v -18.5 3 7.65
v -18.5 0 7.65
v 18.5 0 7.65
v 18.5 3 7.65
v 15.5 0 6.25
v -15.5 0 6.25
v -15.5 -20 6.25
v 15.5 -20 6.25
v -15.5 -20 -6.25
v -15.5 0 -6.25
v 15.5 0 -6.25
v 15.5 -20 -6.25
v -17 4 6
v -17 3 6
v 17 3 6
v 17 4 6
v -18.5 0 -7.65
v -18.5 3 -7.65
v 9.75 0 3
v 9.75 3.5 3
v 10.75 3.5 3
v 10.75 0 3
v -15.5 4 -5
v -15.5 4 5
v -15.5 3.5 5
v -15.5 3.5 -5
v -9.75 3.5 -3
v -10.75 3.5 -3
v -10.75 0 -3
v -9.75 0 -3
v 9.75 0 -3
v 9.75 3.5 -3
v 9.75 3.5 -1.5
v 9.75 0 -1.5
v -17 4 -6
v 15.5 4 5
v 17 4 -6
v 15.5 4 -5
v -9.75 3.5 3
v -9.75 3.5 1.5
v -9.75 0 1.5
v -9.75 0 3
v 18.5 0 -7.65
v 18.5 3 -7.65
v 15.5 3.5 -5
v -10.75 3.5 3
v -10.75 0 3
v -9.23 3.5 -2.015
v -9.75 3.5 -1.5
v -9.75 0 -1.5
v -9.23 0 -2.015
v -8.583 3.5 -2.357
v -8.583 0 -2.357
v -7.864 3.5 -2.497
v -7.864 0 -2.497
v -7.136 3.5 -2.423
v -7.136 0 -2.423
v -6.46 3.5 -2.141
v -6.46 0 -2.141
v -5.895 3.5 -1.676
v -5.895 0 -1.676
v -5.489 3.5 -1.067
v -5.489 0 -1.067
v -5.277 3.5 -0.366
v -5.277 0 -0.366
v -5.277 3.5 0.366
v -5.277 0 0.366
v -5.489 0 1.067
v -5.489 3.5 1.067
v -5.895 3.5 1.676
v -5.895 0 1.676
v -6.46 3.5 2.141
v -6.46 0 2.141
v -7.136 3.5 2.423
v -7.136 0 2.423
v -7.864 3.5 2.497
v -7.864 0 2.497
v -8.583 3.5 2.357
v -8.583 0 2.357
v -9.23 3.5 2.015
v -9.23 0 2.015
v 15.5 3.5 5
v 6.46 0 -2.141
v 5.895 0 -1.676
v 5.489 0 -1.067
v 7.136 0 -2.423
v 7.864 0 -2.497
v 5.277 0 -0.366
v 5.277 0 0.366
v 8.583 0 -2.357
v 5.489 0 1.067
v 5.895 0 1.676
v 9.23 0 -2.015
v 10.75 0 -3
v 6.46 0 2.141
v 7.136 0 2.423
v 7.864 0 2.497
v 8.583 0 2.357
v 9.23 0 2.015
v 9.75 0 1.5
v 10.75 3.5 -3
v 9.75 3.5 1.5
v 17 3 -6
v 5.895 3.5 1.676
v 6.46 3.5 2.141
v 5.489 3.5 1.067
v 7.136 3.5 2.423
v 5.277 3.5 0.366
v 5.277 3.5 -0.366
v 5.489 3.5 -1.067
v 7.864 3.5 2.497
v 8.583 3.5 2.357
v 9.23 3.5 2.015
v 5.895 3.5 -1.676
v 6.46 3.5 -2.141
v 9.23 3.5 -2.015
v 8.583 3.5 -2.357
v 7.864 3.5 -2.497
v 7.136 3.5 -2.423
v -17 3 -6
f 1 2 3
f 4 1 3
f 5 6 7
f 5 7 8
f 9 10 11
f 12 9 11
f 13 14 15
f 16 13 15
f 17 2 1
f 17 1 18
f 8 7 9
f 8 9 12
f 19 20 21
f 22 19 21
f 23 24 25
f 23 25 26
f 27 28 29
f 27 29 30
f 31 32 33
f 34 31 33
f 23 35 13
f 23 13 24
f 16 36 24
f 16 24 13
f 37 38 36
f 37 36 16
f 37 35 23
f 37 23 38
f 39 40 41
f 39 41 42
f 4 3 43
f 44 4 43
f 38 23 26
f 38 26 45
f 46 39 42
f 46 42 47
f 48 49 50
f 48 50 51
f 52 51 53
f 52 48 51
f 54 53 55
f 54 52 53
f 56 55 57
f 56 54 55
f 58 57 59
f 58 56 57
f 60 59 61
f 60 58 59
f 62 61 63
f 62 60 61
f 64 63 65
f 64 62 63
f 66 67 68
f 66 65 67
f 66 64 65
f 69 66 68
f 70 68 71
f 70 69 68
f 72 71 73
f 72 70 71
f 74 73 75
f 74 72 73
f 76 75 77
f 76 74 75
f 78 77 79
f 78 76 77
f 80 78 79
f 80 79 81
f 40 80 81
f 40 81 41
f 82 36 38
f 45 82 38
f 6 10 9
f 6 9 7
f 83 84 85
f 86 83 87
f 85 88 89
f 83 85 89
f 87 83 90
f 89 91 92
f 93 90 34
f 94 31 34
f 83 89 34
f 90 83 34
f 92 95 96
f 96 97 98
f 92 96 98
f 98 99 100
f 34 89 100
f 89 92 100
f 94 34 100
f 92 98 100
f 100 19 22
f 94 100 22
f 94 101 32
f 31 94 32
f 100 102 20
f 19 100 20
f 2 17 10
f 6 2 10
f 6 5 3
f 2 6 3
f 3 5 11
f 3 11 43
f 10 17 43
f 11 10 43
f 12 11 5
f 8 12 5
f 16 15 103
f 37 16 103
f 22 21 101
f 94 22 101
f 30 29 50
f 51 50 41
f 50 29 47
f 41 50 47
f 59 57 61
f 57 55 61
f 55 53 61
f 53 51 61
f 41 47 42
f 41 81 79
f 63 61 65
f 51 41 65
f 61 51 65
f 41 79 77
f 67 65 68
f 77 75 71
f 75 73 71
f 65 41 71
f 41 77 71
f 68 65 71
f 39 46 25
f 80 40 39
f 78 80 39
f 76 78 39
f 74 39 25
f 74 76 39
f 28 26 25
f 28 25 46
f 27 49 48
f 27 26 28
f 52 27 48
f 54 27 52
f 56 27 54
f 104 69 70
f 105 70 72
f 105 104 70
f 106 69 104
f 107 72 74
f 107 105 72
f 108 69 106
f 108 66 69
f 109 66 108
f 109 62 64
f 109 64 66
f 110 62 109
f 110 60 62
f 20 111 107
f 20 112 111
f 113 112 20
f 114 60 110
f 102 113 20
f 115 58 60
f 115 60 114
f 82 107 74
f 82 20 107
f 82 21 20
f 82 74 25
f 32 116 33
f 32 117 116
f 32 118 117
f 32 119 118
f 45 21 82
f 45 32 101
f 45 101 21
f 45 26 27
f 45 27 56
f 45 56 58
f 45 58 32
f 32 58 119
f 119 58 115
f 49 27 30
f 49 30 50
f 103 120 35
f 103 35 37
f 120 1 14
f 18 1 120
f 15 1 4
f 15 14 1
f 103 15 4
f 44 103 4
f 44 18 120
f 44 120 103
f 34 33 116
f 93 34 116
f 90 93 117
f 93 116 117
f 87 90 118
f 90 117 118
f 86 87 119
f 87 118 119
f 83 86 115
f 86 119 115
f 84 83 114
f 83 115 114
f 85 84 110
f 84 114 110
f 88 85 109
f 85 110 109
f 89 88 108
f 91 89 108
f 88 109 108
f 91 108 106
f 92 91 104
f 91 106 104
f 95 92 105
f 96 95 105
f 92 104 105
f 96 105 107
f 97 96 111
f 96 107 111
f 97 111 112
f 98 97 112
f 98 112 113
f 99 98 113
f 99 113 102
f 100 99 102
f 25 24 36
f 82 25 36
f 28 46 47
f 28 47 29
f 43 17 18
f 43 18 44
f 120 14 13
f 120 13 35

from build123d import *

# Parameters (mm, degrees)
SKETCH1_W           = 37
SKETCH1_H           = 15.3
BOSS_EXTRUDE1_DEPTH = 3
SKETCH2_W           = 34
SKETCH2_H           = 12
BOSS_EXTRUDE2_DEPTH = 1
SKETCH3_W           = 31
SKETCH3_H           = 10
CUT_EXTRUDE1_DEPTH  = 0.5
CUT_EXTRUDE2_DEPTH  = 5
SKETCH5_W           = 31
SKETCH5_H           = 12.5
BOSS_EXTRUDE3_DEPTH = 20


with BuildPart() as part:
    # Sketch1 → Boss-Extrude1 (new body)
    with BuildSketch(Plane(origin=(0, 0, 0), x_dir=(1, 0, 0), z_dir=(0, 1, 0))):
        Rectangle(SKETCH1_W, SKETCH1_H)
    extrude(amount=BOSS_EXTRUDE1_DEPTH)

    # Sketch2 → Boss-Extrude2 (add)
    with BuildSketch(Plane(origin=(0, 3, 0), x_dir=(1, 0, 0), z_dir=(0, 1, 0))):
        Rectangle(SKETCH2_W, SKETCH2_H)
    extrude(amount=BOSS_EXTRUDE2_DEPTH)

    # Sketch3 → Cut-Extrude1 (cut)
    with BuildSketch(Plane(origin=(0, 4, 0), x_dir=(1, 0, 0), z_dir=(0, 1, 0))):
        Rectangle(SKETCH3_W, SKETCH3_H)
    extrude(amount=-CUT_EXTRUDE1_DEPTH, mode=Mode.SUBTRACT)

    # Sketch4 → Cut-Extrude2 (cut)
    with BuildSketch(Plane(origin=(0, 3.5, 0), x_dir=(1, 0, 0), z_dir=(0, 1, 0))):
        with BuildLine():
            Line((-10.75, 3), (-9.75, 3))
            Line((-9.75, 3), (-9.75, 1.5))
            ThreePointArc((-9.75, 1.5), (-5.25, 0), (-9.75, -1.5))
            Line((-9.75, -1.5), (-9.75, -3))
            Line((-9.75, -3), (-10.75, -3))
            Line((-10.75, -3), (-10.75, 3))
        make_face()
        with BuildLine():
            Line((9.75, -1.5), (9.75, -3))
            Line((9.75, -3), (10.75, -3))
            Line((10.75, -3), (10.75, 3))
            Line((10.75, 3), (9.75, 3))
            Line((9.75, 3), (9.75, 1.5))
            ThreePointArc((9.75, 1.5), (5.25, 0), (9.75, -1.5))
        make_face()
    extrude(amount=-CUT_EXTRUDE2_DEPTH, mode=Mode.SUBTRACT)

    # Sketch5 → Boss-Extrude3 (add)
    with BuildSketch(Plane.XZ):
        Rectangle(SKETCH5_W, SKETCH5_H)
    extrude(amount=BOSS_EXTRUDE3_DEPTH)


solid = part.part
